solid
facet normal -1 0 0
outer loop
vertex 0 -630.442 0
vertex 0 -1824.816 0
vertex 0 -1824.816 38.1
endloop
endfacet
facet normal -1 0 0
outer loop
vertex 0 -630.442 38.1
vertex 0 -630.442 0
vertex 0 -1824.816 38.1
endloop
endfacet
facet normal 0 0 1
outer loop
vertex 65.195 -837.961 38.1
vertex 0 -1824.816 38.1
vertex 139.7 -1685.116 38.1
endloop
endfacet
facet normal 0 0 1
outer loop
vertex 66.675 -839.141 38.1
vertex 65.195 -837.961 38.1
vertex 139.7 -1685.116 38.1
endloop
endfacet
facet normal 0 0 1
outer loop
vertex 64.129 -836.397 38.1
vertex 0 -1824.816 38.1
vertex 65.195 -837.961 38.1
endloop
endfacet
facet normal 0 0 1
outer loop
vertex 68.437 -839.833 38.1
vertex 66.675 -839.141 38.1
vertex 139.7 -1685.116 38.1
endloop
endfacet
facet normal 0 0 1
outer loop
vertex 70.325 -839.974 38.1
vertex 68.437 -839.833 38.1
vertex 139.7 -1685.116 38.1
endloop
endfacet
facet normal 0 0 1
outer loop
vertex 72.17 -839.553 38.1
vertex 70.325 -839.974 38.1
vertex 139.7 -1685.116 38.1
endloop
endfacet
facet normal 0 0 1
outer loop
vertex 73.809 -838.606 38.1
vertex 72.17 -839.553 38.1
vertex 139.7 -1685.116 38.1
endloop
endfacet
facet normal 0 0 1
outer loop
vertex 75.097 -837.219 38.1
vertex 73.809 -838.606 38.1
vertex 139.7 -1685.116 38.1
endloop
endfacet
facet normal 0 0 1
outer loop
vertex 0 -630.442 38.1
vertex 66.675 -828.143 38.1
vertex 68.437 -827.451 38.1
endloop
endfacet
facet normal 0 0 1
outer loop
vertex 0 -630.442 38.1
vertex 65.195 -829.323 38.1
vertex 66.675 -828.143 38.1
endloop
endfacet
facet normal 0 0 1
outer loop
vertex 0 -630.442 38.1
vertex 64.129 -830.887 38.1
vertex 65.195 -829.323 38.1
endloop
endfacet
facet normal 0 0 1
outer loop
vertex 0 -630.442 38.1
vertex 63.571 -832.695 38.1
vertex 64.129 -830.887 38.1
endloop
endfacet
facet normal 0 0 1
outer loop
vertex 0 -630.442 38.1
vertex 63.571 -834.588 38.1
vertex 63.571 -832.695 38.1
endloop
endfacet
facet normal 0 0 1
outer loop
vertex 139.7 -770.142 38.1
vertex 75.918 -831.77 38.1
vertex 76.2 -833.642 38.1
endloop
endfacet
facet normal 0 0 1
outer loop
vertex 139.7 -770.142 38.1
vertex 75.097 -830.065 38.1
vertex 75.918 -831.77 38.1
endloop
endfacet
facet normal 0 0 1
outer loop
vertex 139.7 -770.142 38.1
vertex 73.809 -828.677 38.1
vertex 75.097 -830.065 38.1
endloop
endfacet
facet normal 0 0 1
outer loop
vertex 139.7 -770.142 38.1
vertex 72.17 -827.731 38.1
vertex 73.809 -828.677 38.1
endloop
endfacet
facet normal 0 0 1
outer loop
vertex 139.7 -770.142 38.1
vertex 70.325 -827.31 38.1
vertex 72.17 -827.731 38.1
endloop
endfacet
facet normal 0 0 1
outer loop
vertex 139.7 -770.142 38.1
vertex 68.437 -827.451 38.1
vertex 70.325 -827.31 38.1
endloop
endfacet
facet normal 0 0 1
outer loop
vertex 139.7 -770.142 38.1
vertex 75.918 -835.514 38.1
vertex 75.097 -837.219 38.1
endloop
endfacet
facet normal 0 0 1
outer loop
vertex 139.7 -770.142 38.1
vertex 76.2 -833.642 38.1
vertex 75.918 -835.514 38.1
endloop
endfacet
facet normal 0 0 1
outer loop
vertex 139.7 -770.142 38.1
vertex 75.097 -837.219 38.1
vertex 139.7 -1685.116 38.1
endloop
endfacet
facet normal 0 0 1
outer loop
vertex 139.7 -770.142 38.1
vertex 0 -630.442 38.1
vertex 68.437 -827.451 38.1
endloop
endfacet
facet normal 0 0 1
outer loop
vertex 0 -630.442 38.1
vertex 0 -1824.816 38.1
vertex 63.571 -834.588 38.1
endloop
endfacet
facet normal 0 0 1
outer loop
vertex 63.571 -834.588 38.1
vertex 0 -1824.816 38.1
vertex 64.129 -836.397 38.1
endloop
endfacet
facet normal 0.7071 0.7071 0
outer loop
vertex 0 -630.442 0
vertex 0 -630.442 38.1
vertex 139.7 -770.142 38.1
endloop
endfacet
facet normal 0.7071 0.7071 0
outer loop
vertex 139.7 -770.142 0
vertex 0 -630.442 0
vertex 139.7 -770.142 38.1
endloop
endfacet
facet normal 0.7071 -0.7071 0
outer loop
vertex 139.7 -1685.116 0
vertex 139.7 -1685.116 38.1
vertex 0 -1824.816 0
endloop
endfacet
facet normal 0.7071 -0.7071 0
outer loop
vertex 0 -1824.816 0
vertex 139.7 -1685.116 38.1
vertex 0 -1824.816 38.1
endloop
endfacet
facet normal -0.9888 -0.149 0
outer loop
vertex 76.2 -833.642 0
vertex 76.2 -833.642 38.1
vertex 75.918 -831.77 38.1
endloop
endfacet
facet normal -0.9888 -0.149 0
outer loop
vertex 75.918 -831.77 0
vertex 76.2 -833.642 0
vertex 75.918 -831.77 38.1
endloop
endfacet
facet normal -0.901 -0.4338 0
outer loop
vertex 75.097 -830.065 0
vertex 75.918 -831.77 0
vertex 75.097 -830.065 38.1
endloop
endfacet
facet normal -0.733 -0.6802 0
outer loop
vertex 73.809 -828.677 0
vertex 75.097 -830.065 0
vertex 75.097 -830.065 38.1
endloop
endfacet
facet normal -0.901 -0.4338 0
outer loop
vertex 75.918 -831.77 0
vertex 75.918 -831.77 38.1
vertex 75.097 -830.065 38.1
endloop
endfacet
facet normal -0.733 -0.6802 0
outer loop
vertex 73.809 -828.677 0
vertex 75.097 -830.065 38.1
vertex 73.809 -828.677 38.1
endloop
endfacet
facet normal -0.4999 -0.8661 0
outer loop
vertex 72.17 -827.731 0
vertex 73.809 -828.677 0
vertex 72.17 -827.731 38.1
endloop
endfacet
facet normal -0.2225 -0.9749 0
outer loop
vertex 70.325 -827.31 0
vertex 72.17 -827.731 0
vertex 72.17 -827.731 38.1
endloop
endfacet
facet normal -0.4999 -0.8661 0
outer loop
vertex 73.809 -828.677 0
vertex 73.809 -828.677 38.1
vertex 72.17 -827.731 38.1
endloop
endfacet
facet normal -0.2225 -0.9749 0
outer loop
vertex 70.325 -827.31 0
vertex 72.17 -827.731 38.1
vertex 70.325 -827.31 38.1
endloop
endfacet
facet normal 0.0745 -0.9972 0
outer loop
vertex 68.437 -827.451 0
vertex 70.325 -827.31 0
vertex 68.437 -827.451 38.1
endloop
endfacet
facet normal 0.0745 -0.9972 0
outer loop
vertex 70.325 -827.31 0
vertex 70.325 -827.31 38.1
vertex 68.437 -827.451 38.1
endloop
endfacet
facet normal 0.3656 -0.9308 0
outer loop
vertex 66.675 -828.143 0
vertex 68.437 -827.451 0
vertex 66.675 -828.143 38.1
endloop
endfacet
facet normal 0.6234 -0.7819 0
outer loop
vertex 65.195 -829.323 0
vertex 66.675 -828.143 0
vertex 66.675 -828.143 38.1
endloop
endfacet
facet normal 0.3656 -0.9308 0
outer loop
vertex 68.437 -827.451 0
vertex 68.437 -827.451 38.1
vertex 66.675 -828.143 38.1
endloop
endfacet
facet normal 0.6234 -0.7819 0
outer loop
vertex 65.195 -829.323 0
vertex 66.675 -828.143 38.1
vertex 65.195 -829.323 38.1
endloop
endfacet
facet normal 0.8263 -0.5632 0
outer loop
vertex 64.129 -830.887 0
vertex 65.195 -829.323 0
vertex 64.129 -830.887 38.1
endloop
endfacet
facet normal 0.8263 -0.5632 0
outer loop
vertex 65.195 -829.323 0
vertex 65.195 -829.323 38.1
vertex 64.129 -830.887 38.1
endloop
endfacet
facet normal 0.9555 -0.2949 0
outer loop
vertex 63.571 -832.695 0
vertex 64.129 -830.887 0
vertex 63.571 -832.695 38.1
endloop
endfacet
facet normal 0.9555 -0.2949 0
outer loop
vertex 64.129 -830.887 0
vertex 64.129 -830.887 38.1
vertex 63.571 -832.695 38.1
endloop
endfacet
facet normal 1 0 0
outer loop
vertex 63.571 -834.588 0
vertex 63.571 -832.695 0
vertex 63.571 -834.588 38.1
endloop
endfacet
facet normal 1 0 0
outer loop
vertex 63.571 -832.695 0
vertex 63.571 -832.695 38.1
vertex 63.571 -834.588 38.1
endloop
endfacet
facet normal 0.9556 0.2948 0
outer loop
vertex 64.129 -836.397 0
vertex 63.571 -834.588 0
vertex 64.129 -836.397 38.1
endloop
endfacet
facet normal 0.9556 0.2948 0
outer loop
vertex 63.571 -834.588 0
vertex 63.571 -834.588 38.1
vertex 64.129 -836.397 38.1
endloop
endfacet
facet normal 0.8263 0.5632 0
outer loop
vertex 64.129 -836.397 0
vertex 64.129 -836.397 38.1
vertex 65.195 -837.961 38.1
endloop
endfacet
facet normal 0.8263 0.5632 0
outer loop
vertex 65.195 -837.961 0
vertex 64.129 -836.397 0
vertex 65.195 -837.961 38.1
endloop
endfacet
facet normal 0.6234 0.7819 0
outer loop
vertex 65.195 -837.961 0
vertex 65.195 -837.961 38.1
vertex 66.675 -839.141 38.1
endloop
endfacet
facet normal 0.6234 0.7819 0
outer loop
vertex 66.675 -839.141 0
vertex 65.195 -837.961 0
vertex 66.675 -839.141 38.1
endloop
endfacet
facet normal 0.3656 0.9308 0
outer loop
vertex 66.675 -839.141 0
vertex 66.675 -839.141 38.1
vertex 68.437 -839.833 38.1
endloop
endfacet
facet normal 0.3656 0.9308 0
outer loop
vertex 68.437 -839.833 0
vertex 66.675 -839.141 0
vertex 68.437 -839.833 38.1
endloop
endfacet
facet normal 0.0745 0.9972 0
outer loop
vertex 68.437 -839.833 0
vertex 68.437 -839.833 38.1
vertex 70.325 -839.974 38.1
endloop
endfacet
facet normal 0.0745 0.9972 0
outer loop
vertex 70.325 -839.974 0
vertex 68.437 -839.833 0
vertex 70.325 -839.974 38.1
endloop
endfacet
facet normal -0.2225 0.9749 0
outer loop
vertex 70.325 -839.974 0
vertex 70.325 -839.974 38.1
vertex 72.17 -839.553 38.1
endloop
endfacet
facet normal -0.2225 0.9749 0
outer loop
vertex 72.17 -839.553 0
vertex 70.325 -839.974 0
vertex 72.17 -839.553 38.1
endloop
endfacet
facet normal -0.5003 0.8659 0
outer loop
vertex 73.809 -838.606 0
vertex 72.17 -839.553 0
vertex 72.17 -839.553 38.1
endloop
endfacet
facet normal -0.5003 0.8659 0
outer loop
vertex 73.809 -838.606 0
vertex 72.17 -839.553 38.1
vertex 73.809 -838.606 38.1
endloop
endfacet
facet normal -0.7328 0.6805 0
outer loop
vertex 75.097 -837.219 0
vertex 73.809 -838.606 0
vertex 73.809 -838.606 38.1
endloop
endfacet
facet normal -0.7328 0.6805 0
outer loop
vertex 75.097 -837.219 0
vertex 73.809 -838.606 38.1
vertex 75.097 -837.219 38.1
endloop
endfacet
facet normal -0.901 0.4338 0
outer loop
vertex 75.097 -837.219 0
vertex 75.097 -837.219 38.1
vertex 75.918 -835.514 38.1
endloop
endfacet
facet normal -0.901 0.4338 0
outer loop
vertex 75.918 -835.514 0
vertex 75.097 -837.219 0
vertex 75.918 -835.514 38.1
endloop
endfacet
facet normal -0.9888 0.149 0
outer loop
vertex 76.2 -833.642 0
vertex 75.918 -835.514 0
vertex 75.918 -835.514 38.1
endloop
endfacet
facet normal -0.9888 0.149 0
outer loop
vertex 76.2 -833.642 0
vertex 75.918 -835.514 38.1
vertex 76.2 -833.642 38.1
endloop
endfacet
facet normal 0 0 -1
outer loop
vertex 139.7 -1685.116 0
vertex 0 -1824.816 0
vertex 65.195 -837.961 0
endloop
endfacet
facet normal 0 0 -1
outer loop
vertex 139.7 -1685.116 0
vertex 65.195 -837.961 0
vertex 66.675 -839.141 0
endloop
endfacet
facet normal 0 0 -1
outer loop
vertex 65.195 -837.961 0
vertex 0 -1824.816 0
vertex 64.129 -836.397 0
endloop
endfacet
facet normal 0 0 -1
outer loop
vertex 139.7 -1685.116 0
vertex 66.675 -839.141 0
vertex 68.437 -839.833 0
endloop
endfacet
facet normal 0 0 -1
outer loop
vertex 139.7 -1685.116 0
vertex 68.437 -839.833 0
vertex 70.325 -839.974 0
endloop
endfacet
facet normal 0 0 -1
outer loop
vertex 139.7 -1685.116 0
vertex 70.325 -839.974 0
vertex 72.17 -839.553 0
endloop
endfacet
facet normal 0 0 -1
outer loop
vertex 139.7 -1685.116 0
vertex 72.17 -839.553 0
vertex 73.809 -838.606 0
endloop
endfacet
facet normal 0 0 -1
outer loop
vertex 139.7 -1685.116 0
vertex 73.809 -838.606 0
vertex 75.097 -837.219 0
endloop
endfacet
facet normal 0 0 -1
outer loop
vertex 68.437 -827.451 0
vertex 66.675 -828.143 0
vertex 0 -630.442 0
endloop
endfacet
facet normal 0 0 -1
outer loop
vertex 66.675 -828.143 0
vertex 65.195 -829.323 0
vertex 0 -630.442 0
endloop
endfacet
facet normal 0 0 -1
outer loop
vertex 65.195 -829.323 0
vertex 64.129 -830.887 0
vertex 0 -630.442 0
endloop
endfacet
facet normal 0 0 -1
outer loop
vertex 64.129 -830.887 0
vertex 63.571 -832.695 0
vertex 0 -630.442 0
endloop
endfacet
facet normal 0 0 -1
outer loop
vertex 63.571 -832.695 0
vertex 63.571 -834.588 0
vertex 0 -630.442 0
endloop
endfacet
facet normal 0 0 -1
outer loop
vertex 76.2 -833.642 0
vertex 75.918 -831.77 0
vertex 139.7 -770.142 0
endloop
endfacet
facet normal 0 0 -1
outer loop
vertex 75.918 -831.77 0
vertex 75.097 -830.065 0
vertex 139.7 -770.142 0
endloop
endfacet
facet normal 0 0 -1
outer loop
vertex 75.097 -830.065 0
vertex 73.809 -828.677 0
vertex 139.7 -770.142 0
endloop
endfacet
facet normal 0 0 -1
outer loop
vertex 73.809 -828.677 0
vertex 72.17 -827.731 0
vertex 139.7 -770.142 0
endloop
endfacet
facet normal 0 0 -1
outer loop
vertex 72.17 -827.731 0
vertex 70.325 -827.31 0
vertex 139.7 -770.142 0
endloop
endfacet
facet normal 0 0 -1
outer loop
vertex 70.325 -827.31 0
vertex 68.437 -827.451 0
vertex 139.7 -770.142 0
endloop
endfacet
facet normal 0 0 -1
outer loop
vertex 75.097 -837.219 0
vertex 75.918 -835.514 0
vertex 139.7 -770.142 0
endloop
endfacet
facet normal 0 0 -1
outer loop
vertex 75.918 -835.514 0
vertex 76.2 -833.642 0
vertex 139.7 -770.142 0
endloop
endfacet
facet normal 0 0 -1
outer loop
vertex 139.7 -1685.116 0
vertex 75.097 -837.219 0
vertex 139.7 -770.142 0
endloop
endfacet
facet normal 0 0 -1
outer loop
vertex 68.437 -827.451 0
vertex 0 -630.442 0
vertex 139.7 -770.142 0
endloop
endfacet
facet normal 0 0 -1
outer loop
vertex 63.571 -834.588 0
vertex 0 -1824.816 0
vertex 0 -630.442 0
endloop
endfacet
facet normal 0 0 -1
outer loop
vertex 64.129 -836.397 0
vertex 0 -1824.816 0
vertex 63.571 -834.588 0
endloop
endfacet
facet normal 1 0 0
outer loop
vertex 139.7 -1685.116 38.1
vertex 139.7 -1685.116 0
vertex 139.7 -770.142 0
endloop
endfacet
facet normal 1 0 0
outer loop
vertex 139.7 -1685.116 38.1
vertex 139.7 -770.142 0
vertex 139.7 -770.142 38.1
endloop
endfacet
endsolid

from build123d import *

# Parameters (mm, degrees)
F0_W      = 139.7
F0_H      = 38.1
F1_DEPTH  = 1828.8
F3_W      = 331.3202857971
F3_H      = 260.5838701129
F4_DEPTH  = 101.6
F7_W      = 1553.4552037716
F7_H      = 1155.3529500961
F8_DEPTH  = 762
F9_R      = 6.35
F10_DEPTH = 38.101


# Not quite as in the source:
# - a feature names something its author has since deleted; it is built from what else it names


with BuildPart() as f1:
    # F0 (on Front) → F1 (new body)
    with BuildSketch(Plane.XZ):
        with Locations((69.85, 19.05)):
            Rectangle(F0_W, F0_H)
    extrude(amount=F1_DEPTH)

    # F3 (on face) → F4 (cut)
    with BuildSketch(Plane(origin=(984.25, -984.25, 0), x_dir=(-0.7071067812, -0.7071067812, 0), z_dir=(-0.7071067812, 0.7071067812, 0))):
        with Locations((1222.6701974869, 7.0506222546)):
            Rectangle(F3_W, F3_H)
    extrude(amount=F4_DEPTH, mode=Mode.SUBTRACT)

    # F7 (on face) → F8 (cut)
    with BuildSketch(Plane(origin=(-315.2209189803, -315.2209189803, 0), x_dir=(0.7071067812, -0.7071067812, 0), z_dir=(-0.7071067812, -0.7071067812, 0))):
        with Locations((614.4417077303, -181.5140247345)):
            Rectangle(F7_W, F7_H)
    extrude(amount=-F8_DEPTH, mode=Mode.SUBTRACT)

    # F9 (on face) → F10 (cut, through all)
    with BuildSketch(Plane.XY.offset(38.1)):
        with Locations((69.85, -833.6418379607)):
            Circle(F9_R)
    extrude(amount=-F10_DEPTH, mode=Mode.SUBTRACT)


solid = f1.part
